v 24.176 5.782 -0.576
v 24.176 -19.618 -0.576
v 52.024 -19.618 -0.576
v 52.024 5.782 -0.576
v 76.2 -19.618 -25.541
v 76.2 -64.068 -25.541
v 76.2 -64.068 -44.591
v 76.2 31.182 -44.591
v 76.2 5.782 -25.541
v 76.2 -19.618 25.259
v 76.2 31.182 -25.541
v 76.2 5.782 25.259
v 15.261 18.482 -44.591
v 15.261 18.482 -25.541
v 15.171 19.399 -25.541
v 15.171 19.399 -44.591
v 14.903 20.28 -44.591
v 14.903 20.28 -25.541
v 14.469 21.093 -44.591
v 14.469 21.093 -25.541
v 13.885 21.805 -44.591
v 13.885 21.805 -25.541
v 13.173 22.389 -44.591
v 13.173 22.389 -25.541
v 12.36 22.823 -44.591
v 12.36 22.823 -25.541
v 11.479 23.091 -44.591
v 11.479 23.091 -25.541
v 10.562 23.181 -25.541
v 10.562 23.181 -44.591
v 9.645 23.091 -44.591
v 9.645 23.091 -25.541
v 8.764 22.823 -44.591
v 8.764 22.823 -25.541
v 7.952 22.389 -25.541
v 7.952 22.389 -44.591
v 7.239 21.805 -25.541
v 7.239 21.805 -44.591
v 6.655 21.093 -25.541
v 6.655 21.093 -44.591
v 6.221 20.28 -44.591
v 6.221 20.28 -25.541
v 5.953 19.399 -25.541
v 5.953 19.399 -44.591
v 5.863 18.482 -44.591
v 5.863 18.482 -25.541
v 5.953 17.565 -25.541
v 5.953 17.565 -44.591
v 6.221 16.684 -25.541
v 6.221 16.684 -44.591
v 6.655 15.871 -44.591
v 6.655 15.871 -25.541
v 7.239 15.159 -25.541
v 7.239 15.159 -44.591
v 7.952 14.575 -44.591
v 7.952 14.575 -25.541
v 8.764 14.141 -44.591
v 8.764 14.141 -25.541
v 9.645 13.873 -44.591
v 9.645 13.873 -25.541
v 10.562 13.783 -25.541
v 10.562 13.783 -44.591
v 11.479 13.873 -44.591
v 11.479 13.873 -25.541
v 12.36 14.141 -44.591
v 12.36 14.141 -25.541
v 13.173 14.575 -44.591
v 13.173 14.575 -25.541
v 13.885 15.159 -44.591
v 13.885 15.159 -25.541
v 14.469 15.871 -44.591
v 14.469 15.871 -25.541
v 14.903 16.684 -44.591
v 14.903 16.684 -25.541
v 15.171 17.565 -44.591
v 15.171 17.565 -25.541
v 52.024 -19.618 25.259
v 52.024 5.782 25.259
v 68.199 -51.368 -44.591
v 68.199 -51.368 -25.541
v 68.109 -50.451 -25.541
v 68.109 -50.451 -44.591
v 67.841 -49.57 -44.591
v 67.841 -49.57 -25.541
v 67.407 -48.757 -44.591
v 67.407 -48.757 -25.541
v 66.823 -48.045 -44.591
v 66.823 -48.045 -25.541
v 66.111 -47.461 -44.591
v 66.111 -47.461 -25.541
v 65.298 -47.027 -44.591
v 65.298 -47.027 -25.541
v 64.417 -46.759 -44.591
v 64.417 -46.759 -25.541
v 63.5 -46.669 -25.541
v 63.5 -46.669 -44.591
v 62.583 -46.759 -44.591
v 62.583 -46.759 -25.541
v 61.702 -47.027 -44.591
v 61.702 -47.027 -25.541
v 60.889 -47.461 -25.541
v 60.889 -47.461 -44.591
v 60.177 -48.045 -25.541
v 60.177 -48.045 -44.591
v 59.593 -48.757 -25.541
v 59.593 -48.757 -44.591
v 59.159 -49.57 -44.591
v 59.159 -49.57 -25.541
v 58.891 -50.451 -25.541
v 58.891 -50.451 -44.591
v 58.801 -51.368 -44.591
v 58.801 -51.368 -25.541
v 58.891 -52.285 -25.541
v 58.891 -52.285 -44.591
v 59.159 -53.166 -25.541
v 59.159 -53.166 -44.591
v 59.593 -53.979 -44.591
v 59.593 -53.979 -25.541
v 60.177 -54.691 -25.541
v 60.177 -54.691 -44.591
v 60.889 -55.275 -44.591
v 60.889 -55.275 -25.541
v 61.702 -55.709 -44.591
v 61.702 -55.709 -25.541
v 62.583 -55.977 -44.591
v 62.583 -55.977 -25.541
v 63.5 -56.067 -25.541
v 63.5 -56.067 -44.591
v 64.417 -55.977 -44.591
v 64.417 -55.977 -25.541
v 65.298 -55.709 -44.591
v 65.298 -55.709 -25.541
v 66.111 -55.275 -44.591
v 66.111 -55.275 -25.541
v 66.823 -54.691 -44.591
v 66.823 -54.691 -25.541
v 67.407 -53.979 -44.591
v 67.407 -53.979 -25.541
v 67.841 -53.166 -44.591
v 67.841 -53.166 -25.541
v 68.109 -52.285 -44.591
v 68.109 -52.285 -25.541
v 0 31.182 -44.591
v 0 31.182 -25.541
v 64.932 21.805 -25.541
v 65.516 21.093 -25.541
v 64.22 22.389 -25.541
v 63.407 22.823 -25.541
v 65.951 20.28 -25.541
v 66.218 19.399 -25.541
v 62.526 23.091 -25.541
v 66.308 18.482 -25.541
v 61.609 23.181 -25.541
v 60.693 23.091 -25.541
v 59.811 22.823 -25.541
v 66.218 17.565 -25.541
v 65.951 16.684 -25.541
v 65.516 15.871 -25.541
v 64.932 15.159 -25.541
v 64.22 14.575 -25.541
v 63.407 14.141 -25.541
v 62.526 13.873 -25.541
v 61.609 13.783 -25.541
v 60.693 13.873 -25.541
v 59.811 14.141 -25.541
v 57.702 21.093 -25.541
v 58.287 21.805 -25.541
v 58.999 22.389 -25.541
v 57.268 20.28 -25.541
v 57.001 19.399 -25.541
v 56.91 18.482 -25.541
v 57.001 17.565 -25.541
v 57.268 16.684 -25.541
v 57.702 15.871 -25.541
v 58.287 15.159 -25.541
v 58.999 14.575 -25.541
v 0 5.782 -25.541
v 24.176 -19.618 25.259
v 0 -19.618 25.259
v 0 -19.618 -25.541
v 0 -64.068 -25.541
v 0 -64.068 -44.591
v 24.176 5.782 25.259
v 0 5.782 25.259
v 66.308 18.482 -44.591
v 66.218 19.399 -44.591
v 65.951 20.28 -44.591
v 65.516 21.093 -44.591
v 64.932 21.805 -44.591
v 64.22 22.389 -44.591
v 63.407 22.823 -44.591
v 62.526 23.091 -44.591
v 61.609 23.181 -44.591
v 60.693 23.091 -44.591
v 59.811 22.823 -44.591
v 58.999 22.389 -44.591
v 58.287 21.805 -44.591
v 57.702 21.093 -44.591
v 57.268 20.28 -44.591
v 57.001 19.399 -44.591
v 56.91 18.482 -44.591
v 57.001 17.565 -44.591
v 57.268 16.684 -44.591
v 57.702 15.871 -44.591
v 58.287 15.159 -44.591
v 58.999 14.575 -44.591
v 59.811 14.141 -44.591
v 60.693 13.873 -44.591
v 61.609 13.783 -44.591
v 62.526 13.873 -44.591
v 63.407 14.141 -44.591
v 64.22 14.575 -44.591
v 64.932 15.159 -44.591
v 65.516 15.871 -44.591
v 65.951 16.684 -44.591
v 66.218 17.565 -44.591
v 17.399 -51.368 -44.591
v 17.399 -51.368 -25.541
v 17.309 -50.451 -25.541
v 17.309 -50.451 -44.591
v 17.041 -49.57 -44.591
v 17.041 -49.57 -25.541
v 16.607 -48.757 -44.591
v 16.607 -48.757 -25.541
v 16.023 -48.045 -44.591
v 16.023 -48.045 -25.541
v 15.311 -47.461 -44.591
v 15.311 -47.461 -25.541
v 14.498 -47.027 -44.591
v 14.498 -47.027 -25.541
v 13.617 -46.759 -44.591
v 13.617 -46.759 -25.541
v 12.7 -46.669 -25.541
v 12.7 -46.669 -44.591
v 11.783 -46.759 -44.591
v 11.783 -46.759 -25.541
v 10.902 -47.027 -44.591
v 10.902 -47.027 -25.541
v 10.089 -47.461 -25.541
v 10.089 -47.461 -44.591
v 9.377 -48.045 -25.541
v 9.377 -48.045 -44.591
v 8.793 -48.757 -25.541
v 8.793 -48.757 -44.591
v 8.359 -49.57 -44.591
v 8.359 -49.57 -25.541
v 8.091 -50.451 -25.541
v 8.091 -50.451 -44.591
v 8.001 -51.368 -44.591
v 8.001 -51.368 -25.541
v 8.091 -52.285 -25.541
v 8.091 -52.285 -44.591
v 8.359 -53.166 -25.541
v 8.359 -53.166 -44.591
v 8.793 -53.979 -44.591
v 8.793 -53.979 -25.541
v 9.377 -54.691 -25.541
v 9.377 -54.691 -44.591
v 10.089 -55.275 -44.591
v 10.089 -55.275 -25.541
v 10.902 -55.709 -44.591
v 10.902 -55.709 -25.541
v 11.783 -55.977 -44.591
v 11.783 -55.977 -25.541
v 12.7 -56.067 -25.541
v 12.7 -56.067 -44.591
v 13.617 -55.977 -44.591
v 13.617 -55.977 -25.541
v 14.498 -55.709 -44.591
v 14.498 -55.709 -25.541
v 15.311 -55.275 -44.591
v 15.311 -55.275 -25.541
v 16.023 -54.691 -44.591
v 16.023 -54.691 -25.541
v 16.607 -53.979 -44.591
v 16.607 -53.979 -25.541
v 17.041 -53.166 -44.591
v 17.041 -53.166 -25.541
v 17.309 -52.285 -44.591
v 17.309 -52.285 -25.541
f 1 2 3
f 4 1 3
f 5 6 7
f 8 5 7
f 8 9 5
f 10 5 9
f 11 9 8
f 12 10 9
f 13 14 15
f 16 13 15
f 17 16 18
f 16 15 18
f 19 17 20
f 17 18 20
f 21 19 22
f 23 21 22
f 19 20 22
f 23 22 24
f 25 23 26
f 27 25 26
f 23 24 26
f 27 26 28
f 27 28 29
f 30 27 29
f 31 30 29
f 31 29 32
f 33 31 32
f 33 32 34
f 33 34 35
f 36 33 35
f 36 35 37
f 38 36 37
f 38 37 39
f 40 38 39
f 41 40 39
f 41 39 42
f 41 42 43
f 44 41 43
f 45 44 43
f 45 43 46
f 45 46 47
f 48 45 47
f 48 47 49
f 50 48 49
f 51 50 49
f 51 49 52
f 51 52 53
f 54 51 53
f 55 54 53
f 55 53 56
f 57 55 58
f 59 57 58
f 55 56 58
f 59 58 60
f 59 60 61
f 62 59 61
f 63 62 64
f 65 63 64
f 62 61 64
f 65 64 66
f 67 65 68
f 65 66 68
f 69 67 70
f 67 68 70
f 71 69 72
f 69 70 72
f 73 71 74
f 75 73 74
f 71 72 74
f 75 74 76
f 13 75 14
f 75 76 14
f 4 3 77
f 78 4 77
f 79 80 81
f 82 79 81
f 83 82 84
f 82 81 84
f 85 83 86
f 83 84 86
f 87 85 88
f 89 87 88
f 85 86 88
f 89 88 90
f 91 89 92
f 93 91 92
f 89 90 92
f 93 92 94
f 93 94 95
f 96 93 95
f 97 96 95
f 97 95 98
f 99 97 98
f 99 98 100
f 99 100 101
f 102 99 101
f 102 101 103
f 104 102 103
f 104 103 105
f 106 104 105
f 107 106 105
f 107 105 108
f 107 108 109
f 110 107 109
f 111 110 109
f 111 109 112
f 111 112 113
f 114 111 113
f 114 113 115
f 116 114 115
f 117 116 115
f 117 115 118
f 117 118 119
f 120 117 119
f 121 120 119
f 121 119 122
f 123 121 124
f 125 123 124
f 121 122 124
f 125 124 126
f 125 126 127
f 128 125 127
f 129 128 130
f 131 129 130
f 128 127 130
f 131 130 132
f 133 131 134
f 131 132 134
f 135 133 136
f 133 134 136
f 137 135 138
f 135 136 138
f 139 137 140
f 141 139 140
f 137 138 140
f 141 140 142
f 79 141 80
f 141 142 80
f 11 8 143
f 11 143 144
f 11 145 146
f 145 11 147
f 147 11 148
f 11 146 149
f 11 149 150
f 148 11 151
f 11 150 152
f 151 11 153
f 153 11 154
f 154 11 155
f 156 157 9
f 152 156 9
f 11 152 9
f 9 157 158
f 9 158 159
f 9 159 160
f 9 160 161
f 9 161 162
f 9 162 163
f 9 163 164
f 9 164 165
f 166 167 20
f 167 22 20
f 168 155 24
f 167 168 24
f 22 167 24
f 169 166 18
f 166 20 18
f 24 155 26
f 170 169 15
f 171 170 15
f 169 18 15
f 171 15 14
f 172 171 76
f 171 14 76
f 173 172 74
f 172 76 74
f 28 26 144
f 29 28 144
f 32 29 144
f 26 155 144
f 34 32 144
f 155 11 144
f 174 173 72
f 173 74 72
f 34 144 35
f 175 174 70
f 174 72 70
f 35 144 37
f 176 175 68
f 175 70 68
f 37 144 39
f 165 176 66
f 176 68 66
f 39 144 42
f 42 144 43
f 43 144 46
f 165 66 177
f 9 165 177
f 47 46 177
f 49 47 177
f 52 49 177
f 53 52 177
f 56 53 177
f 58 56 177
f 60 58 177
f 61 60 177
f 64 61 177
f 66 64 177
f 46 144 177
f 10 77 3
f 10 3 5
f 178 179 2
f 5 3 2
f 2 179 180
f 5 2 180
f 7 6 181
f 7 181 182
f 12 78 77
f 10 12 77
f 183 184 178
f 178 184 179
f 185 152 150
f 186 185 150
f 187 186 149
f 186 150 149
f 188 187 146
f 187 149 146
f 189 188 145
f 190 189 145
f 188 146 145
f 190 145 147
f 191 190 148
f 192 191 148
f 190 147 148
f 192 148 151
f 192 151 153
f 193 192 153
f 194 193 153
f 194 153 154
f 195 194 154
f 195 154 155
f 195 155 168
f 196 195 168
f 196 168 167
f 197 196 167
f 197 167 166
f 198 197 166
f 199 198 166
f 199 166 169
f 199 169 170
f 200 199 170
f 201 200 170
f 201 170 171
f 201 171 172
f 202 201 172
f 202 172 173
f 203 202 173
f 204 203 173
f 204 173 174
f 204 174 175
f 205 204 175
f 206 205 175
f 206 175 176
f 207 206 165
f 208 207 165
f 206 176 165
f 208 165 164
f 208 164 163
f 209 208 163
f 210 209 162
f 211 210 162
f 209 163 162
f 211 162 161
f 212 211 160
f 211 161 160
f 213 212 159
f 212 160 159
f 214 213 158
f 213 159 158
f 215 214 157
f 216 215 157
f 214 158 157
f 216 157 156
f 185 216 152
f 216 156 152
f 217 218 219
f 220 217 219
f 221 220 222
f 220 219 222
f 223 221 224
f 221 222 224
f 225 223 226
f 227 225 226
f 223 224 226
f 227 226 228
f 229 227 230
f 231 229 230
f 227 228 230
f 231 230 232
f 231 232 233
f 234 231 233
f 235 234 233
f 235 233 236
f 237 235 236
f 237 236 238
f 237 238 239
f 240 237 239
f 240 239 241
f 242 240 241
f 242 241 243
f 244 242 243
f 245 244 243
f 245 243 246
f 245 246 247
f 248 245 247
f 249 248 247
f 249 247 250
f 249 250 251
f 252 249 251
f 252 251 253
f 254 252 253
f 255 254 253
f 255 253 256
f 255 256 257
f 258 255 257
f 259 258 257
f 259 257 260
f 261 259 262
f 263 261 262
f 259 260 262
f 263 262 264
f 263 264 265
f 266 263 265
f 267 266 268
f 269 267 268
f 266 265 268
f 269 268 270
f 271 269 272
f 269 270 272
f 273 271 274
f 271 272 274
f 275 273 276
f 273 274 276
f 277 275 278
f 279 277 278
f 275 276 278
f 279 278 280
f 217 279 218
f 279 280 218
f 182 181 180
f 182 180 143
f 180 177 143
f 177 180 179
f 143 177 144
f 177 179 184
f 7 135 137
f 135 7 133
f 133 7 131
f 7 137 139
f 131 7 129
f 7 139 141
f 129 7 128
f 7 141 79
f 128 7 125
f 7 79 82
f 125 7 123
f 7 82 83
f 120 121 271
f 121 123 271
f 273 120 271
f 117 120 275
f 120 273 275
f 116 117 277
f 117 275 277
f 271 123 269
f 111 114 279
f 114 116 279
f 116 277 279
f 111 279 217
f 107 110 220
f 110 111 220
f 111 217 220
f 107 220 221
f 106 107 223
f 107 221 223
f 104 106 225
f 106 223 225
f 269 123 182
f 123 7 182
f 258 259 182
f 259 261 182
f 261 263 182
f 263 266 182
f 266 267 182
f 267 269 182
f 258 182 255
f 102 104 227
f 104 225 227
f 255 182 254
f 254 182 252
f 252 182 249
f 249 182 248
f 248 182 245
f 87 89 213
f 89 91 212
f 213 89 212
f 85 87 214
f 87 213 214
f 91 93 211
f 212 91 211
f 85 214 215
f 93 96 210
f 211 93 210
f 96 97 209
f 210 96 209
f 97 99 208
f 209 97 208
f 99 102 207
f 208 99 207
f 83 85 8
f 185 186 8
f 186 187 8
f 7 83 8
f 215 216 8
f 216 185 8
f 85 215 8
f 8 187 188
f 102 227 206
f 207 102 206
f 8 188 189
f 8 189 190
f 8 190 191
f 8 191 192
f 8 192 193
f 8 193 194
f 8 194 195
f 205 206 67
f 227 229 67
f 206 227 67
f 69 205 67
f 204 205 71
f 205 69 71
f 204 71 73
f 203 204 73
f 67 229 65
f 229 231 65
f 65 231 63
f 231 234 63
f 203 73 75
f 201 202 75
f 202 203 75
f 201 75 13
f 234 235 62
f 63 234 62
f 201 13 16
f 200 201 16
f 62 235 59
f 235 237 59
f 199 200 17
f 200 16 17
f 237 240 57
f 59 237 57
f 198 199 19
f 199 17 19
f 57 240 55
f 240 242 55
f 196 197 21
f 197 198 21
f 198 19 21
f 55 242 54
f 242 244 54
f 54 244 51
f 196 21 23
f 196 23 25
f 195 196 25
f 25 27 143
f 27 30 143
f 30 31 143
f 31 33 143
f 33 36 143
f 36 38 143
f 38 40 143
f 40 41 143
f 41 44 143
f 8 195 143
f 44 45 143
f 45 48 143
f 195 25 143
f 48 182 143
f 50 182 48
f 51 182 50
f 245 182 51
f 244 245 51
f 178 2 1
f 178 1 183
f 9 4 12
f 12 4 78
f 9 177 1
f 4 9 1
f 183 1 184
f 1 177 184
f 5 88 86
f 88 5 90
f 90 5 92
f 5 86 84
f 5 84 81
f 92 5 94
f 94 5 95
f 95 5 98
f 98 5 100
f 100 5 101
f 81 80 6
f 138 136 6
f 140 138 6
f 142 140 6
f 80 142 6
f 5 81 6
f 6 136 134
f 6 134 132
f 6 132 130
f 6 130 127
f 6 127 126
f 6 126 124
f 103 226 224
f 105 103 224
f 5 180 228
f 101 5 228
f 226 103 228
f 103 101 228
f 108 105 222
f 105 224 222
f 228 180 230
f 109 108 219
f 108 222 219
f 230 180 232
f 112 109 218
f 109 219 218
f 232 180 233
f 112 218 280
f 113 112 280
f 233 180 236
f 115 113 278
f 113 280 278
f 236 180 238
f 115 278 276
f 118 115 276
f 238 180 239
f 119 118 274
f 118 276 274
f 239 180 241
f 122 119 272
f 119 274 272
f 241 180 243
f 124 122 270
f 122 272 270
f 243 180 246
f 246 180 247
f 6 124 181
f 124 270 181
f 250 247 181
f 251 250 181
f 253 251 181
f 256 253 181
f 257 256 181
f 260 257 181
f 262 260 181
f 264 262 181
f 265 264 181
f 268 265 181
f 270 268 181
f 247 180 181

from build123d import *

# Parameters (mm, degrees)
F1_DEPTH = 76.2
F2_W     = 27.847374
F2_H     = 51.670779
F3_DEPTH = 50.801
F4_R     = 4.699
F5_DEPTH = 76.2
F6_DEPTH = 19.051


with BuildPart() as f1:
    # F0 (on Right) → F1 (new body)
    with BuildSketch(Plane.YZ):
        Polygon((-19.618108, -25.540555), (-64.068108, -25.540555), (-64.068108, -44.590555), (31.181892, -44.590555), (31.181892, -25.540555), (5.781892, -25.540555), (5.781892, 25.259445), (-19.618108, 25.259445), align=None)
    extrude(amount=F1_DEPTH)

    # F2 (on face) → F3 (cut, through all)
    with BuildSketch(Plane.XZ.offset(19.618108)):
        with Locations((38.1, 25.259445)):
            Rectangle(F2_W, F2_H)
    extrude(amount=-F3_DEPTH, mode=Mode.SUBTRACT)

    # F4 (on face) → F5 (cut)
    with BuildSketch(Plane.XY.offset(-25.540555)):
        with Locations((12.7, -51.368108)):
            Circle(F4_R)
        with Locations((63.5, -51.368108)):
            Circle(F4_R)
        with Locations((10.562182, 18.481892)):
            Circle(F4_R)
        with Locations((61.609245, 18.481892)):
            Circle(F4_R)
    extrude(amount=F5_DEPTH, mode=Mode.SUBTRACT)

    # F4 (on face) → F6 (cut, through all)
    with BuildSketch(Plane.XY.offset(-25.540555)):
        with Locations((12.7, -51.368108)):
            Circle(F4_R)
        with Locations((63.5, -51.368108)):
            Circle(F4_R)
        with Locations((10.562182, 18.481892)):
            Circle(F4_R)
        with Locations((61.609245, 18.481892)):
            Circle(F4_R)
    extrude(amount=-F6_DEPTH, mode=Mode.SUBTRACT)


solid = f1.part
